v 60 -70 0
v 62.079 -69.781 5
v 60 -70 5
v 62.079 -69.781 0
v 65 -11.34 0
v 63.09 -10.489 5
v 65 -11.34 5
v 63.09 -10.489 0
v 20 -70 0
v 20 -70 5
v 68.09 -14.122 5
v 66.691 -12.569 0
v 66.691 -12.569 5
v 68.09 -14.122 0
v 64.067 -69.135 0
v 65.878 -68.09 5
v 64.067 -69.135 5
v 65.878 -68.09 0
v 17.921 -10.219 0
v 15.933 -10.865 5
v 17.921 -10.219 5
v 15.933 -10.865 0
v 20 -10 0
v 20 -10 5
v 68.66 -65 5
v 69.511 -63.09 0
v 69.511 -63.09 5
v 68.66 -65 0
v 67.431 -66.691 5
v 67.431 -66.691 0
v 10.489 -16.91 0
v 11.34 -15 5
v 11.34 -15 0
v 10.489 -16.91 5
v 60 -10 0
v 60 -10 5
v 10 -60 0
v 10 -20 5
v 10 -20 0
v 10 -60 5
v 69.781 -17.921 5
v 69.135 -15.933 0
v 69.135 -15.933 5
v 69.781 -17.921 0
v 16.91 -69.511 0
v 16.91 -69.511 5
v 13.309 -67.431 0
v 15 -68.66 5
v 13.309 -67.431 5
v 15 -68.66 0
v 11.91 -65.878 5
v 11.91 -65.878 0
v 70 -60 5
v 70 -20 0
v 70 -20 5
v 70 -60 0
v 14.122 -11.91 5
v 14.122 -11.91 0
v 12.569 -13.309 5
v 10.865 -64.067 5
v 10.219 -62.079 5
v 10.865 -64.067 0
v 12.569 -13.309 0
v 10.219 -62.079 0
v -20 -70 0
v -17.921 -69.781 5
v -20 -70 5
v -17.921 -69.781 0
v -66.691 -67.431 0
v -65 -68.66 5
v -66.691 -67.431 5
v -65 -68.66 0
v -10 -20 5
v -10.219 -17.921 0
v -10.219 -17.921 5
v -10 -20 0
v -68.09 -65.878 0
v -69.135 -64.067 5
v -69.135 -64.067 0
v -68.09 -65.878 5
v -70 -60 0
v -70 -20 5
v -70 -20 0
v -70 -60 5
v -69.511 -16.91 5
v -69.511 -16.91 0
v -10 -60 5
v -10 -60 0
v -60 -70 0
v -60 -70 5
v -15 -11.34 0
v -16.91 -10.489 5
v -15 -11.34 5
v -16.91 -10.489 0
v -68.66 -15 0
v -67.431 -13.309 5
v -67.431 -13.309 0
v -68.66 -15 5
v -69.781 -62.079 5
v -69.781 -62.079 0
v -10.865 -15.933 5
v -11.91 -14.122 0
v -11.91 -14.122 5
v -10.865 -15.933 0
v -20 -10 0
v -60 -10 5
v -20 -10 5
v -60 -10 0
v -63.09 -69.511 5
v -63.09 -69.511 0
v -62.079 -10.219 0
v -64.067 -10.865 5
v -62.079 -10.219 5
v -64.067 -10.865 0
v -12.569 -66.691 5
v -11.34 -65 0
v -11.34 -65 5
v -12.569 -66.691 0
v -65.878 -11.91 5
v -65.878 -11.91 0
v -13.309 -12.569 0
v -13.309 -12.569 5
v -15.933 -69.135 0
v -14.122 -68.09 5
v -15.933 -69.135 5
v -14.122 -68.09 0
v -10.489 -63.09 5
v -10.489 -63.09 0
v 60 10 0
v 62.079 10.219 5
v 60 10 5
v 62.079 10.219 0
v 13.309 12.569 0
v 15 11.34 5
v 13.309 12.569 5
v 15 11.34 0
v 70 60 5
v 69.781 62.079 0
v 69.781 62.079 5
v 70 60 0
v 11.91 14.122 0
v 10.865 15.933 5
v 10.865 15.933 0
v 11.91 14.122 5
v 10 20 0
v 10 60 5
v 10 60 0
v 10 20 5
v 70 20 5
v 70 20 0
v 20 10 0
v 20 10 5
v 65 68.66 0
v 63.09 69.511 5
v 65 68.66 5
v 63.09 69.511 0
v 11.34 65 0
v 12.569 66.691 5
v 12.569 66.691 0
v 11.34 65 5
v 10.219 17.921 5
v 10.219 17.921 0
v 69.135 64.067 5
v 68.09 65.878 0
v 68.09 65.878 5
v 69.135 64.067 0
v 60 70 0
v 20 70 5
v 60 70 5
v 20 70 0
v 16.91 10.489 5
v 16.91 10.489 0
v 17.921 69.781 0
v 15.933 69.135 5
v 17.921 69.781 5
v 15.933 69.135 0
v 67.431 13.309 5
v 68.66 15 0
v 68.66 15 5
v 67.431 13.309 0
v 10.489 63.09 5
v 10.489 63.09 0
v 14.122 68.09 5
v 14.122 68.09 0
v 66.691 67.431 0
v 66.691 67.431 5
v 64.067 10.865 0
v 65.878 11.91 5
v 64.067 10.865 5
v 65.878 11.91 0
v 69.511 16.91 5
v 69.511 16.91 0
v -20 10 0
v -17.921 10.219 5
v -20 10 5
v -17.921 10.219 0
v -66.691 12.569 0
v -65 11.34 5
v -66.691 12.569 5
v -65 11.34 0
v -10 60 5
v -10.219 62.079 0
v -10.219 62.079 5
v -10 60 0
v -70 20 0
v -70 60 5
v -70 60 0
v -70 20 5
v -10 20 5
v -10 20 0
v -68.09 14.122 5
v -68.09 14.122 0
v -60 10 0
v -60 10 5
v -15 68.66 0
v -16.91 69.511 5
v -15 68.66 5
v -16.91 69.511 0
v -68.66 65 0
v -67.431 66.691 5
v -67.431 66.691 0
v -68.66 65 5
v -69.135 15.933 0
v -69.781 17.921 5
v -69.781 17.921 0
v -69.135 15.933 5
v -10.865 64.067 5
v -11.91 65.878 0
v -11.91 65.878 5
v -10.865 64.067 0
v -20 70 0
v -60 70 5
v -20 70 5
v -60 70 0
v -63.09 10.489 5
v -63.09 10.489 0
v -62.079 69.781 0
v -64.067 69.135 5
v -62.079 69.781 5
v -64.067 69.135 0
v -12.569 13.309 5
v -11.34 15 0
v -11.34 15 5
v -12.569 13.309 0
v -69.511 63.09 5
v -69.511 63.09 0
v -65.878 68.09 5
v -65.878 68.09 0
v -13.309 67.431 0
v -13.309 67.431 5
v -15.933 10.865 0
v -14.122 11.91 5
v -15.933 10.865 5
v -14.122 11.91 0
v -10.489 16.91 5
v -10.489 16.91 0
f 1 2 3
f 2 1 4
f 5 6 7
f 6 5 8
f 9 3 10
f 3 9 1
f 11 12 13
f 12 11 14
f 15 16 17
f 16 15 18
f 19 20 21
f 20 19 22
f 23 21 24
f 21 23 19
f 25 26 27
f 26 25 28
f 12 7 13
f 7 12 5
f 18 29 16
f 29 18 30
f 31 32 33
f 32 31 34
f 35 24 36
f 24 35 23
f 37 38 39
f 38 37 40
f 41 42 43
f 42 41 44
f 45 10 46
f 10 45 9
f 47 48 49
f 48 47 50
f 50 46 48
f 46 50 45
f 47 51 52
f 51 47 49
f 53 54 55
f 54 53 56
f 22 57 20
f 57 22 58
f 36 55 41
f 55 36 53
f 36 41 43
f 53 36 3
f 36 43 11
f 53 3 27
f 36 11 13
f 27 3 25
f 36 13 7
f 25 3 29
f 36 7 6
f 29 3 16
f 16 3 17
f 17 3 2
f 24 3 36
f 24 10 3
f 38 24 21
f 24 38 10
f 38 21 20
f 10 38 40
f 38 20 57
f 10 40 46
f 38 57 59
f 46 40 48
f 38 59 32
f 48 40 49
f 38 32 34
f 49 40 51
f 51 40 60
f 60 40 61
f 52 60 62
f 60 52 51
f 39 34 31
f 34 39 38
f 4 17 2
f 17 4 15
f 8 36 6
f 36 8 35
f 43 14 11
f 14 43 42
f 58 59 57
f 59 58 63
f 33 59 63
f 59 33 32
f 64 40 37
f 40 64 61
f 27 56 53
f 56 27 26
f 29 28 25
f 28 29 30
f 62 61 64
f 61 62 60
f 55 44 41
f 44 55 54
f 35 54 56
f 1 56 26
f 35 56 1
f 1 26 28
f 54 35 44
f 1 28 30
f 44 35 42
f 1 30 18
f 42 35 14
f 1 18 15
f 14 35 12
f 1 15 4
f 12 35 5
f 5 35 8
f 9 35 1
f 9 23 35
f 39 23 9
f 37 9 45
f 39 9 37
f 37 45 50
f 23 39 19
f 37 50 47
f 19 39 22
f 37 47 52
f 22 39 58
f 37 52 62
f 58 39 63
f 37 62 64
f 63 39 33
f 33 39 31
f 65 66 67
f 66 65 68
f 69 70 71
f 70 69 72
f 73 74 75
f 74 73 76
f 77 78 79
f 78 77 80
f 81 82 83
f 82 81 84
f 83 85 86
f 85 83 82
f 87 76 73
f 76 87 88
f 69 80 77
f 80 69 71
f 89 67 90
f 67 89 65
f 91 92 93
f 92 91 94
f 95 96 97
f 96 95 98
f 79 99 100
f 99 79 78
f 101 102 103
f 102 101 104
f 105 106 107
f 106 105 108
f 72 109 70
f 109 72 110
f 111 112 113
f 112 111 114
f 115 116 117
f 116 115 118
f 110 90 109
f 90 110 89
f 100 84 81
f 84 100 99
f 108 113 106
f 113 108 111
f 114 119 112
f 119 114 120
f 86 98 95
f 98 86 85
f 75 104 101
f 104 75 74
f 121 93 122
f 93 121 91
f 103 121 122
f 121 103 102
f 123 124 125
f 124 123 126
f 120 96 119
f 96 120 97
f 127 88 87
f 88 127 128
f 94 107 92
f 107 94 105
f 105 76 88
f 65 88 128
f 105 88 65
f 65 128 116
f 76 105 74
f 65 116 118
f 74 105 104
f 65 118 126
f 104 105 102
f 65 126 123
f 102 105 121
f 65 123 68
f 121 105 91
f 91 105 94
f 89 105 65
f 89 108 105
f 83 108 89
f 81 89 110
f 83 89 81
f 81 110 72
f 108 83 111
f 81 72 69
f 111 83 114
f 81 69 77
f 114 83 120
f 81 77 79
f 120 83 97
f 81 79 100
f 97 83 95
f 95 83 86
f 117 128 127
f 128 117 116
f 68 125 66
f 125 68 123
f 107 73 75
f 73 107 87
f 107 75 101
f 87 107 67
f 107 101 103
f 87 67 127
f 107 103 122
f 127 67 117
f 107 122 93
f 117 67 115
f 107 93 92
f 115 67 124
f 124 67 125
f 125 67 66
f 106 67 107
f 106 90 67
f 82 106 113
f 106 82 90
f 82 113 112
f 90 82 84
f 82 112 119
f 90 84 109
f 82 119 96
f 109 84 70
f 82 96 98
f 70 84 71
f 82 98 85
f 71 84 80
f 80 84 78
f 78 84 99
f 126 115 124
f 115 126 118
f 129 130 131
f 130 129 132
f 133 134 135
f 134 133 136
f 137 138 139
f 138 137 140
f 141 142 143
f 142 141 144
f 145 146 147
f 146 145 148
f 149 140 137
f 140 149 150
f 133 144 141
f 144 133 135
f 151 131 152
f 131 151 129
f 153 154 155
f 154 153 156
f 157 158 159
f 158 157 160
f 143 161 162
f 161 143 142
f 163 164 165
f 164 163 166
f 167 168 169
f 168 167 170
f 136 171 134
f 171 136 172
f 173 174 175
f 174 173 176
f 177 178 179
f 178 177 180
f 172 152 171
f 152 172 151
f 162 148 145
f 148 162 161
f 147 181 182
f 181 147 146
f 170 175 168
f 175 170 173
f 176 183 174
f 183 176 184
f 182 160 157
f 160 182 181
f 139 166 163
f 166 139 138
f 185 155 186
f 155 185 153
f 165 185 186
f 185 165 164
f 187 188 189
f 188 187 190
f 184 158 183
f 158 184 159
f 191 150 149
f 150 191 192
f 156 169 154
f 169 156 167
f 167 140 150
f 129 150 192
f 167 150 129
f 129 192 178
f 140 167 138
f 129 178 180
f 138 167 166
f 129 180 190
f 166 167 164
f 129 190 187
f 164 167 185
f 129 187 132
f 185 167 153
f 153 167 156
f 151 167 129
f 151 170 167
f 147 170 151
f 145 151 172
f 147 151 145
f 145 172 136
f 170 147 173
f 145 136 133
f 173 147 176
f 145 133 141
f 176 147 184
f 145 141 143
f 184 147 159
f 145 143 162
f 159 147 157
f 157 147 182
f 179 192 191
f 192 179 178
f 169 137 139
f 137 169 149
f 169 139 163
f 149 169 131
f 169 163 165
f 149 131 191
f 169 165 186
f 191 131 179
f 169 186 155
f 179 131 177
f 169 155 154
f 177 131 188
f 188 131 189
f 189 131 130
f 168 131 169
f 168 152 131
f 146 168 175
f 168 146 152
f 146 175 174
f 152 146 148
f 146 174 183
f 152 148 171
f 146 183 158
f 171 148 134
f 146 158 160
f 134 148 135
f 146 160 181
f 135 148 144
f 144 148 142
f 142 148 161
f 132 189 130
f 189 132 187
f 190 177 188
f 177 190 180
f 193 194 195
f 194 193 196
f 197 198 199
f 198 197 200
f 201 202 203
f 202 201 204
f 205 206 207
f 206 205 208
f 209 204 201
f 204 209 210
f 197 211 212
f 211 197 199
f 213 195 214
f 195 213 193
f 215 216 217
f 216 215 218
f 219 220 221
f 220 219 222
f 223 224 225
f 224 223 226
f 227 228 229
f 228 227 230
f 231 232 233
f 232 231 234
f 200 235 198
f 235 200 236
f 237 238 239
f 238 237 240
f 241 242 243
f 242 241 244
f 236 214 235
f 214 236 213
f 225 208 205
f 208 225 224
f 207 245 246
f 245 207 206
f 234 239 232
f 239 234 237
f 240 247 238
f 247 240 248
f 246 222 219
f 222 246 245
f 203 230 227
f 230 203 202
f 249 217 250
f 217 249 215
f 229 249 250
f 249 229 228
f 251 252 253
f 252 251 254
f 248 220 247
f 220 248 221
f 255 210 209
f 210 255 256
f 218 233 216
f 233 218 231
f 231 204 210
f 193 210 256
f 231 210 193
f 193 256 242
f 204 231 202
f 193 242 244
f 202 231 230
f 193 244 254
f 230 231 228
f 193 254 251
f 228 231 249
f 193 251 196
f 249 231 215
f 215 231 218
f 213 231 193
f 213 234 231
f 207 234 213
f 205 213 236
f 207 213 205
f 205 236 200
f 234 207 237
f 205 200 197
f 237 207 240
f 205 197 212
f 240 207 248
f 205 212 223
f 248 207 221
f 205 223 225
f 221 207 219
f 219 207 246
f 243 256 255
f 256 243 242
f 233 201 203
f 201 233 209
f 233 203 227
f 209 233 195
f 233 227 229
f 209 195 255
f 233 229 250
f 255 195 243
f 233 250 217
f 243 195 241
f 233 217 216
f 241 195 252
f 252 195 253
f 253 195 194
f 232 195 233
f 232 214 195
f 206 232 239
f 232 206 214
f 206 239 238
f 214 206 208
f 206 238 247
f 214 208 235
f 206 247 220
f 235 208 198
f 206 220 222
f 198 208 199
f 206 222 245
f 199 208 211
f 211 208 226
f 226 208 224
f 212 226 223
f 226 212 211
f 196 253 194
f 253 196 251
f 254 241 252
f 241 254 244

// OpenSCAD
// run
run = "microsoft"; // [microsoft, animated, background,print]

run(run);

module run(run) {
    if (run == "microsoft") {
        windowslogo();
    }
    else if (run == "animated") {
        animated();
    }
    else if (run == "background") {
        background();
    }
    else if (run == "print") {
        linear_extrude(5) offset(10) square([40,40],true);
    }
}

module animated() {
    rotate([0,$t*360,0]) windowslogo();
}

module background() {
    for (x = [0:16]) {
        for (y = [0:8]) {
           translate([x*200,y*200,0]) rotate([180,180,0]) rotate([x*22.5,y*45,0]) windowslogo();
        }
    }
}

module windowslogo() {
    color("yellow") linear_extrude(5) translate([40,-40,0]) offset(10) square([40,40],true);
    color("lightblue") linear_extrude(5) translate([-40,-40,0]) offset(10) square([40,40],true);
    color("lightgreen") linear_extrude(5) translate([40,40,0]) offset(10) square([40,40],true);
    color("OrangeRed") linear_extrude(5) translate([-40,40,0]) offset(10) square([40,40],true);
}
